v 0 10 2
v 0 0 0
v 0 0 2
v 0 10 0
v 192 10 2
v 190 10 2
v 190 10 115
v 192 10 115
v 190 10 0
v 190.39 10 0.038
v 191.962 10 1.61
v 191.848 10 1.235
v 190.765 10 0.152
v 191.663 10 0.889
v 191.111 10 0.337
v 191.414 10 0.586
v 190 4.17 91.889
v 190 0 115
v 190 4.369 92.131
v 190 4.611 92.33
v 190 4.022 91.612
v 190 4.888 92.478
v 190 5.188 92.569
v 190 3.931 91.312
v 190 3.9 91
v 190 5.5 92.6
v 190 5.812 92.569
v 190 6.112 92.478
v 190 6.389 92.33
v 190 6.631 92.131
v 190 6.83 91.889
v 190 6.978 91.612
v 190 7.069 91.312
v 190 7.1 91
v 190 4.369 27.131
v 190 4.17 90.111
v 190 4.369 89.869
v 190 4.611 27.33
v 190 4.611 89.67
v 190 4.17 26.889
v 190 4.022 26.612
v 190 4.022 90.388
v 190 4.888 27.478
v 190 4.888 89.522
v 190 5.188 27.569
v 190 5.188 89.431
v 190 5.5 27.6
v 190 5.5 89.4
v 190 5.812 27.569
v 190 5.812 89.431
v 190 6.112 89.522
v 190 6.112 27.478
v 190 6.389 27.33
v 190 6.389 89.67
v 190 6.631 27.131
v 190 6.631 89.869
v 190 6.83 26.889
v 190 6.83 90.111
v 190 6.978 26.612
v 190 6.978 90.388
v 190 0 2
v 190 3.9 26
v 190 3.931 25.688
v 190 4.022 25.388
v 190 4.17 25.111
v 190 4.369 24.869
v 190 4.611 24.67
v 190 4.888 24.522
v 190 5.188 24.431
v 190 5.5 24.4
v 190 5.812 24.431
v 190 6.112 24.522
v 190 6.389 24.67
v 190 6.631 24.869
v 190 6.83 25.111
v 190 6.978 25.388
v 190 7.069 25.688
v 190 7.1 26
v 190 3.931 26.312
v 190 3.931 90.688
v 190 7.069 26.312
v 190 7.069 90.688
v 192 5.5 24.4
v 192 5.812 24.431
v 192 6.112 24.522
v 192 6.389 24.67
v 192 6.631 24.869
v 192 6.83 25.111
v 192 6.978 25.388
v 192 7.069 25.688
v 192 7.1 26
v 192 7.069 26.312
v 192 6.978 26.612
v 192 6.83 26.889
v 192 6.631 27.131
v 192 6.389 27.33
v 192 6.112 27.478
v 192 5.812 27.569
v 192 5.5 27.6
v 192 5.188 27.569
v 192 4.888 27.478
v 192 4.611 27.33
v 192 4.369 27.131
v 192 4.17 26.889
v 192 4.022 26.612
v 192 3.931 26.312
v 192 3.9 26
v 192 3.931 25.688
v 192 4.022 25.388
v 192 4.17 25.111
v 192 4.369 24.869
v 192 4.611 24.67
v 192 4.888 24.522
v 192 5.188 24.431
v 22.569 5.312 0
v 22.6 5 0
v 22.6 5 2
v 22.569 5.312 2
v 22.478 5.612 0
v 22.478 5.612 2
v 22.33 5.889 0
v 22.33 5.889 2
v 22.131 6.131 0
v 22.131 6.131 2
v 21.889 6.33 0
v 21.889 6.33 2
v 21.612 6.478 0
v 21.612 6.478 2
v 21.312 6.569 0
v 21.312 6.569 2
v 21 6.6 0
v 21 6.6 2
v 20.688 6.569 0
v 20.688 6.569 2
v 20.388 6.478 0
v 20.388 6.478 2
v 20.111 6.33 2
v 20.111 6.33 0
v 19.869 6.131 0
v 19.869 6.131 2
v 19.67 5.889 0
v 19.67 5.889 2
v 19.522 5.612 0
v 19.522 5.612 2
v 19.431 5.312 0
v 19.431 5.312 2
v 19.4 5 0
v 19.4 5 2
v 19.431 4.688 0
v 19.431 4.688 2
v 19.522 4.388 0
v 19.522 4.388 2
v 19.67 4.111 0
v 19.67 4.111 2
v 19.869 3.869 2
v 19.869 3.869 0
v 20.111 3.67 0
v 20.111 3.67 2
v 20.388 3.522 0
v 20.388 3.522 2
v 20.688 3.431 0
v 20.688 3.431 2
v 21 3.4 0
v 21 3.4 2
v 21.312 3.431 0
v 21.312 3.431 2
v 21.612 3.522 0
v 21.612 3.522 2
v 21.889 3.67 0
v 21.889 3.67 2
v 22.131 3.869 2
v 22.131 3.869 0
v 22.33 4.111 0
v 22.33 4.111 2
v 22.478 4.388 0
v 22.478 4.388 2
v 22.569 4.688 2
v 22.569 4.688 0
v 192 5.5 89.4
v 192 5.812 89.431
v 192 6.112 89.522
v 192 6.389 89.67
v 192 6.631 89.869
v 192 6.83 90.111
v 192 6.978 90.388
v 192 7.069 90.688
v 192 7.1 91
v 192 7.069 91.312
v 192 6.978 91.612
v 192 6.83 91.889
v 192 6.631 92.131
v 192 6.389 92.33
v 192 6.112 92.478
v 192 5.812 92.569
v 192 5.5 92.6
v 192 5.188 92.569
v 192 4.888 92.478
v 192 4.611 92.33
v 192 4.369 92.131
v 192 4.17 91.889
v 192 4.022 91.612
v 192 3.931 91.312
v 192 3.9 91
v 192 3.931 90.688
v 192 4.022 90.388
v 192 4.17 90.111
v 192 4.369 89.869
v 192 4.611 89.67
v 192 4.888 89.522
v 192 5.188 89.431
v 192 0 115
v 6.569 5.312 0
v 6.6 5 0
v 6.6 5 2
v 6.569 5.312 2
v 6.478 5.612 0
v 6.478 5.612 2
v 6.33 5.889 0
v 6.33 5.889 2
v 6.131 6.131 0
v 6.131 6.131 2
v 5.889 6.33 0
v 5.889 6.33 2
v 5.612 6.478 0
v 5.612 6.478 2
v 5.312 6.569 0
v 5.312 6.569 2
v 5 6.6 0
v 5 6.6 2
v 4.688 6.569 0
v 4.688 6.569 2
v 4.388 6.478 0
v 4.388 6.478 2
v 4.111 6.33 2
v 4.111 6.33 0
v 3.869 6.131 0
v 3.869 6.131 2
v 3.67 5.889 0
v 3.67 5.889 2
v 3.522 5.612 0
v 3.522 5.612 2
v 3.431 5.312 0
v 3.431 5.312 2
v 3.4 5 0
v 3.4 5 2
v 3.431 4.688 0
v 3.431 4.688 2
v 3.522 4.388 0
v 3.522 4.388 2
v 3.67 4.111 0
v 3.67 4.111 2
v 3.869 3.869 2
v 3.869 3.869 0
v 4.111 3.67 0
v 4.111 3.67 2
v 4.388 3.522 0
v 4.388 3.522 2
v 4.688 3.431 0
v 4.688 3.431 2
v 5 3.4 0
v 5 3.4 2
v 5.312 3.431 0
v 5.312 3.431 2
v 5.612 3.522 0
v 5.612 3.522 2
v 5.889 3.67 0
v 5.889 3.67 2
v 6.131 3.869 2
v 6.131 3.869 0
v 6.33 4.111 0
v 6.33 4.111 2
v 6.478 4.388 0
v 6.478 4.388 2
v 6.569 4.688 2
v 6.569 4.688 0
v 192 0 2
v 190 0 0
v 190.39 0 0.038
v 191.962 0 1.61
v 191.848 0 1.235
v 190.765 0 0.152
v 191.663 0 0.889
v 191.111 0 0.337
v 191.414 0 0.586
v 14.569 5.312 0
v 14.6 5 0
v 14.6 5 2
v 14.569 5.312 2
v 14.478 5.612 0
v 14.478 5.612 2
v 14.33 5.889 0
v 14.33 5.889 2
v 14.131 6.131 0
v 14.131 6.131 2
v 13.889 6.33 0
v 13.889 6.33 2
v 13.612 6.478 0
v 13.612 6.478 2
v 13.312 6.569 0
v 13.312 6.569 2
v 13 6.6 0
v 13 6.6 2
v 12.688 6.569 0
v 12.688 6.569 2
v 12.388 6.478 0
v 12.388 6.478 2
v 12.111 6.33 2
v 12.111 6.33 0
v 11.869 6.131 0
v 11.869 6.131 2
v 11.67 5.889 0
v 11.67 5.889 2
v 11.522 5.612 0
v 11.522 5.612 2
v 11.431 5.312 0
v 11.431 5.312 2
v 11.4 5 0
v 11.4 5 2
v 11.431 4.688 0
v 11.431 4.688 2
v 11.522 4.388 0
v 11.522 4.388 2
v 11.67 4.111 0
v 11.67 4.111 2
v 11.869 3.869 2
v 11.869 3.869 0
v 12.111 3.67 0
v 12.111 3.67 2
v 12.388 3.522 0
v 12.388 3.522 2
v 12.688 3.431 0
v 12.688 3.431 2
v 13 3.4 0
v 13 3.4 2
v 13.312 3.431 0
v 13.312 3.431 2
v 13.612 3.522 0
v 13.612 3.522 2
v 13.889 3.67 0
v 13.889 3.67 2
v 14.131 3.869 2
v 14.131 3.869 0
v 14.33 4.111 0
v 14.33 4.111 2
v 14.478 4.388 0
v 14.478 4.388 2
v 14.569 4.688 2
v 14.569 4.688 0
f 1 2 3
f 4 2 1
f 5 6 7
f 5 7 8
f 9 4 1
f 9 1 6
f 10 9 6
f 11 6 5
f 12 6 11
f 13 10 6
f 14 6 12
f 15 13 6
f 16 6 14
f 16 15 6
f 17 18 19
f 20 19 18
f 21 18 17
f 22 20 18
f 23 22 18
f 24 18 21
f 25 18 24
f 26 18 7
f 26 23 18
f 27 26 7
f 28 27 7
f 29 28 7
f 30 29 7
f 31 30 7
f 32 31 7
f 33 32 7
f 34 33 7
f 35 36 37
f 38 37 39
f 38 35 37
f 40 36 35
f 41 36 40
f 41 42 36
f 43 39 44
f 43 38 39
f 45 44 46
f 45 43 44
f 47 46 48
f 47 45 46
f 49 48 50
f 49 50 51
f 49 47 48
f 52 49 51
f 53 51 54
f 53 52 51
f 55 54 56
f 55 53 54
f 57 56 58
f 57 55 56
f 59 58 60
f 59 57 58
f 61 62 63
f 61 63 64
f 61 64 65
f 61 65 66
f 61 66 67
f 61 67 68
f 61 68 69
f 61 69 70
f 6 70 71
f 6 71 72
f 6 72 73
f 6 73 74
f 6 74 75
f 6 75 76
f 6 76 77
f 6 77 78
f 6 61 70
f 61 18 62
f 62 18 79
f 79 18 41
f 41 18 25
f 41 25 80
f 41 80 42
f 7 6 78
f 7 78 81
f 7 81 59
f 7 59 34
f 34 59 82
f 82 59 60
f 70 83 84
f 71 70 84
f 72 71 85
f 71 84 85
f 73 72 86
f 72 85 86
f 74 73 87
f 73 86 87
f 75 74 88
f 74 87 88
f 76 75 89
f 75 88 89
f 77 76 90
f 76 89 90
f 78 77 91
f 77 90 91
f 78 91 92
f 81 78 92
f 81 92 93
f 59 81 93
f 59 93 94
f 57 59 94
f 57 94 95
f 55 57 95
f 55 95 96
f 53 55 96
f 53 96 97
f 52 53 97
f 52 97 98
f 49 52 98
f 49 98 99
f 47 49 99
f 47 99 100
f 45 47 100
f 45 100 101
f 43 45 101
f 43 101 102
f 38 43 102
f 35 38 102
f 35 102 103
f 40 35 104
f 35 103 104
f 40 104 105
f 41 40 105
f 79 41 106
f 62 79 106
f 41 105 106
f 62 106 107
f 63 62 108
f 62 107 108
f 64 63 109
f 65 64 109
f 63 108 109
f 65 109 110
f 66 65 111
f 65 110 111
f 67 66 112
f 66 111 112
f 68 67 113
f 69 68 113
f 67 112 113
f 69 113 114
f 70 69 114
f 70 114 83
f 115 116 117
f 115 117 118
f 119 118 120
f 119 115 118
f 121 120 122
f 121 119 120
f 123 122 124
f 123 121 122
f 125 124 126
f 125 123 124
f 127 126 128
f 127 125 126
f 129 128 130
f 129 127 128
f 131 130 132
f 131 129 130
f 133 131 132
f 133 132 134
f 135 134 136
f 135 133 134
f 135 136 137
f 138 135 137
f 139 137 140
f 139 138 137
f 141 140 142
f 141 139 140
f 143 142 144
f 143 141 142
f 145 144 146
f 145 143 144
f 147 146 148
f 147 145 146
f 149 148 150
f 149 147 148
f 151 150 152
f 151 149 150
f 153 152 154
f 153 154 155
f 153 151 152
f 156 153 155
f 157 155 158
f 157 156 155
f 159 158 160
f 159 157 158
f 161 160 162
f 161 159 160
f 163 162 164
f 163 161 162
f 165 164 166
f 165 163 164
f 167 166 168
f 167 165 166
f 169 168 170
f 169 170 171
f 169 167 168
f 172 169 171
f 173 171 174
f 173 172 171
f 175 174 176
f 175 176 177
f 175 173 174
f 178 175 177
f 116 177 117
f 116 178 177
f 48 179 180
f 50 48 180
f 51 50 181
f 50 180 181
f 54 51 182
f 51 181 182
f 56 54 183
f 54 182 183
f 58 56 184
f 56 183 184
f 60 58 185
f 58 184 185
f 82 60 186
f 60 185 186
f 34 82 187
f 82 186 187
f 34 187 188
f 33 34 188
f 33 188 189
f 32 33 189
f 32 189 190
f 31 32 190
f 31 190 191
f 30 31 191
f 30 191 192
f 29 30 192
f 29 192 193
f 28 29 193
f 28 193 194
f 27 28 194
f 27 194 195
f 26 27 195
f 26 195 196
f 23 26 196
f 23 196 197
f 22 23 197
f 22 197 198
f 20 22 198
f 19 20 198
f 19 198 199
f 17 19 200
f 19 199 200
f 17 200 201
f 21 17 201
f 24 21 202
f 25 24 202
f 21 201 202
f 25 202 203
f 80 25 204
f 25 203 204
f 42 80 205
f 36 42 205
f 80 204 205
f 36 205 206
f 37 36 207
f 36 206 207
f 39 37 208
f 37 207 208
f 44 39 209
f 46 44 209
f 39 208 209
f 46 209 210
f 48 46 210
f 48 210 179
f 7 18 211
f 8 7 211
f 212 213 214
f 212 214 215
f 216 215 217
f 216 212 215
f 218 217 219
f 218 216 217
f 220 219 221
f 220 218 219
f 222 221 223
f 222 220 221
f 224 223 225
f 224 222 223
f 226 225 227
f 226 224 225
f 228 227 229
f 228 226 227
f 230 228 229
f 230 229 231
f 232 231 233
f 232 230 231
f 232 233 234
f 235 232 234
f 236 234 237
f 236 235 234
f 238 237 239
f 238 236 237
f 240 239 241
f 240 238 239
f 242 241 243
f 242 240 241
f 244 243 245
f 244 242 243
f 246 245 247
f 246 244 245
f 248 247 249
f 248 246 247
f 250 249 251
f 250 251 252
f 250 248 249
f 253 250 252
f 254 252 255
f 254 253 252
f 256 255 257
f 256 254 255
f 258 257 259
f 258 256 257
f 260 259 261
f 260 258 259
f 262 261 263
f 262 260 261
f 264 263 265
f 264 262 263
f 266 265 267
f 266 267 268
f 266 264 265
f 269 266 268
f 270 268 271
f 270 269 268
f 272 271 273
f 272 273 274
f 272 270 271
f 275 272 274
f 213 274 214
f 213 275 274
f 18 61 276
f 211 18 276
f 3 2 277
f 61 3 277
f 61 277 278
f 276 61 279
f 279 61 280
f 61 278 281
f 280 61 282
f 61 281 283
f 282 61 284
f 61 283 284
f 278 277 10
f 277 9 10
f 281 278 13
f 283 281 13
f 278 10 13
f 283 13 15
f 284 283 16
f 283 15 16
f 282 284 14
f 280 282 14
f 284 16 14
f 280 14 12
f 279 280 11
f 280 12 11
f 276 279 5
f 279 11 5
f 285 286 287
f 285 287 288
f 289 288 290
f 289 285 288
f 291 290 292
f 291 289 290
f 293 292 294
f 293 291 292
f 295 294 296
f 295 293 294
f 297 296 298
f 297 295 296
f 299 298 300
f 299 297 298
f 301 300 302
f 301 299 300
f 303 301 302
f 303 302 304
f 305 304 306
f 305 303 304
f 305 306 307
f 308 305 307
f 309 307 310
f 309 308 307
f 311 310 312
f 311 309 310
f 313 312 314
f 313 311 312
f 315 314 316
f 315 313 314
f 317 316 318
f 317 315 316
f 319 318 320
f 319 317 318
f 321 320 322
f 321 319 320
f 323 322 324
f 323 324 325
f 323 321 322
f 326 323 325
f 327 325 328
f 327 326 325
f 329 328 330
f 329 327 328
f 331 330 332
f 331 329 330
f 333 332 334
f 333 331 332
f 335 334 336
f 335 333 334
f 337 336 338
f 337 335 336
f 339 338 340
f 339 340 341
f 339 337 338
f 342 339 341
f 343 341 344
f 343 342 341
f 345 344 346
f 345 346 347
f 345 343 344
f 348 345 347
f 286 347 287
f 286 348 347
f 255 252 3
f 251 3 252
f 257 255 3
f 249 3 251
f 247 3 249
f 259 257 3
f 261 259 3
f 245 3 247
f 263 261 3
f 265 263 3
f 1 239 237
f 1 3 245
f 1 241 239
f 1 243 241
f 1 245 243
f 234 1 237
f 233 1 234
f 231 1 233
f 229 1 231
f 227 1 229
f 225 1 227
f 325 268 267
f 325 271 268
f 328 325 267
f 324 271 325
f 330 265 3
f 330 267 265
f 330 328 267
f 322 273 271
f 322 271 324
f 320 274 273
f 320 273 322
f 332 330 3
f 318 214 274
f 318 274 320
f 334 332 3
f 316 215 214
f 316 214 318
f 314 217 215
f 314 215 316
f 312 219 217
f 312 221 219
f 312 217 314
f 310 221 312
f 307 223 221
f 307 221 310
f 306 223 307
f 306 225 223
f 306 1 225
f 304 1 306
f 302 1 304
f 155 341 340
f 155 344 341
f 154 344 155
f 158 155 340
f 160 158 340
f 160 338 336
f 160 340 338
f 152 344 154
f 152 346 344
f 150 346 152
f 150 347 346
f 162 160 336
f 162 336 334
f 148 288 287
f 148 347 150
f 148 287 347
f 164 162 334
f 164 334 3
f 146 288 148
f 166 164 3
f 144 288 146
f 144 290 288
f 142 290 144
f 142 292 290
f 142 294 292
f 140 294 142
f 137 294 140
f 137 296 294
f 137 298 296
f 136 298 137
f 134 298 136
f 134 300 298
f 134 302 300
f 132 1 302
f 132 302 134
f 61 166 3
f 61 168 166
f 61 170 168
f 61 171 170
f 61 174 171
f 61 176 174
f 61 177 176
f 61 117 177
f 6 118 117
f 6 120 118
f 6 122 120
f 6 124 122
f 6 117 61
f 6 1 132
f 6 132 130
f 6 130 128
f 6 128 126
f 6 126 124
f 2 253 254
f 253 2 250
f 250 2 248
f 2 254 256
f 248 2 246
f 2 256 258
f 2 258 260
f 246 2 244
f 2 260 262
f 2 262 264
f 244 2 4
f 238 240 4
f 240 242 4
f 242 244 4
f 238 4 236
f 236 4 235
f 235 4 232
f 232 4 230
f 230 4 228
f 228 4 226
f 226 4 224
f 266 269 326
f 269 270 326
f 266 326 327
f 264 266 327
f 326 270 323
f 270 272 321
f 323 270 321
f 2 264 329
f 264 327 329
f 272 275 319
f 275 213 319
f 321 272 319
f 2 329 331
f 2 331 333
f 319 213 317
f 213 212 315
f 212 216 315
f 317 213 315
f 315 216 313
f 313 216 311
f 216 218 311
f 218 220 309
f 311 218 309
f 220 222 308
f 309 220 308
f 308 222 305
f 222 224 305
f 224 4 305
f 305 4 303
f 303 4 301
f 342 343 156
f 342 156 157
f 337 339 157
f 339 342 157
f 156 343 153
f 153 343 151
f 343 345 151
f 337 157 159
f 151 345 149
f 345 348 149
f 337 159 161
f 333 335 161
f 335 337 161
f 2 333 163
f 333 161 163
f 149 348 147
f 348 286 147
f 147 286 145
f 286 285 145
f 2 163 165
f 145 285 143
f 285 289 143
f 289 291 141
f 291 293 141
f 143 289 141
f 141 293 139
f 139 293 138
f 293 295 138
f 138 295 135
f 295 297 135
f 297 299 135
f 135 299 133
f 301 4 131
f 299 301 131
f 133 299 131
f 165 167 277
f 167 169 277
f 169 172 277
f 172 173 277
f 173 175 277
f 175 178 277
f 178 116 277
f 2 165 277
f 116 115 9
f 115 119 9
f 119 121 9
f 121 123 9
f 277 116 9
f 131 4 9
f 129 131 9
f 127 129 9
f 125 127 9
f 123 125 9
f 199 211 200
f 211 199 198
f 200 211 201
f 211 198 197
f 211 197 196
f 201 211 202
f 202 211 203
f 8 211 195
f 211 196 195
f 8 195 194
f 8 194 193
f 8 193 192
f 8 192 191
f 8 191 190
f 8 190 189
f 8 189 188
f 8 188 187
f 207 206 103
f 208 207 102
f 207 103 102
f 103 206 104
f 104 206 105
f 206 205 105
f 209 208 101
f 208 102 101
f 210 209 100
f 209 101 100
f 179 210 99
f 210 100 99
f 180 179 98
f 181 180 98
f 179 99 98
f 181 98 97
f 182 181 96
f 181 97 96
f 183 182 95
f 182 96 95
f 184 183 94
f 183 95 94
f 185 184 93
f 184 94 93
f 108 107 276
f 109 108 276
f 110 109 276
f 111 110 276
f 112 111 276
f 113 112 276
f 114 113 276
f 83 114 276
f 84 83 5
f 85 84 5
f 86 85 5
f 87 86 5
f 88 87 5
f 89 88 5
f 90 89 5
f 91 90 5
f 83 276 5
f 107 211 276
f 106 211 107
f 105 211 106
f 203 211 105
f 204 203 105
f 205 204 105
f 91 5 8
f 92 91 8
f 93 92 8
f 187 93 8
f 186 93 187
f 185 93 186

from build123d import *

# Parameters (mm, degrees)
ESQUISSE1_W             = 190
ESQUISSE1_H             = 10
ESQUISSE1_R             = 1.6
BOSS_EXTRU_1_DEPTH      = 2
ESQUISSE2_W             = 2
ESQUISSE2_H             = 10
BOSS_EXTRU_2_DEPTH      = 115
CONG_1_R                = 2
ENL_V_MAT_EXTRU_1_REACH = 226.029
ESQUISSE3_R             = 1.6


with BuildPart() as part:
    # Esquisse1 → Boss.-Extru.1 (new body)
    with BuildSketch(Plane.XY):
        with Locations((95, 5)):
            Rectangle(ESQUISSE1_W, ESQUISSE1_H)
        with Locations((5, 5)):
            Circle(ESQUISSE1_R, mode=Mode.SUBTRACT)
        with Locations((13, 5)):
            Circle(ESQUISSE1_R, mode=Mode.SUBTRACT)
        with Locations((21, 5)):
            Circle(ESQUISSE1_R, mode=Mode.SUBTRACT)
    extrude(amount=BOSS_EXTRU_1_DEPTH)

    # Esquisse2 → Boss.-Extru.2 (add)
    with BuildSketch(Plane.XY):
        with Locations((191, 5)):
            Rectangle(ESQUISSE2_W, ESQUISSE2_H)
    extrude(amount=BOSS_EXTRU_2_DEPTH)

    # Congé1
    cong_1_edges = [part.edges().sort_by_distance(p)[0] for p in [
        (192, 5, 0),
    ]]
    fillet(cong_1_edges, radius=CONG_1_R)

    # Esquisse3 → Enlèv. mat.-Extru.1 (cut, up to next)
    with BuildSketch(Plane(origin=(192, 0, 0), x_dir=(0, 0, -1), z_dir=(1, 0, 0)), mode=Mode.PRIVATE) as enl_v_mat_extru_1_sk1:
        with Locations((-91, 5.5)):
            Circle(ESQUISSE3_R)
    enl_v_mat_extru_1_tool1 = extrude(enl_v_mat_extru_1_sk1.sketch, amount=-ENL_V_MAT_EXTRU_1_REACH, mode=Mode.PRIVATE) & part.part
    # Esquisse3 → Enlèv. mat.-Extru.1 (cut, up to next)
    with BuildSketch(Plane(origin=(192, 0, 0), x_dir=(0, 0, -1), z_dir=(1, 0, 0)), mode=Mode.PRIVATE) as enl_v_mat_extru_1_sk2:
        with Locations((-26, 5.5)):
            Circle(ESQUISSE3_R)
    enl_v_mat_extru_1_tool2 = extrude(enl_v_mat_extru_1_sk2.sketch, amount=-ENL_V_MAT_EXTRU_1_REACH, mode=Mode.PRIVATE) & part.part
    add(enl_v_mat_extru_1_tool1.solids().sort_by_distance((192, 5.5, 91))[0], mode=Mode.SUBTRACT)
    add(enl_v_mat_extru_1_tool2.solids().sort_by_distance((192, 5.5, 26))[0], mode=Mode.SUBTRACT)


solid = part.part
